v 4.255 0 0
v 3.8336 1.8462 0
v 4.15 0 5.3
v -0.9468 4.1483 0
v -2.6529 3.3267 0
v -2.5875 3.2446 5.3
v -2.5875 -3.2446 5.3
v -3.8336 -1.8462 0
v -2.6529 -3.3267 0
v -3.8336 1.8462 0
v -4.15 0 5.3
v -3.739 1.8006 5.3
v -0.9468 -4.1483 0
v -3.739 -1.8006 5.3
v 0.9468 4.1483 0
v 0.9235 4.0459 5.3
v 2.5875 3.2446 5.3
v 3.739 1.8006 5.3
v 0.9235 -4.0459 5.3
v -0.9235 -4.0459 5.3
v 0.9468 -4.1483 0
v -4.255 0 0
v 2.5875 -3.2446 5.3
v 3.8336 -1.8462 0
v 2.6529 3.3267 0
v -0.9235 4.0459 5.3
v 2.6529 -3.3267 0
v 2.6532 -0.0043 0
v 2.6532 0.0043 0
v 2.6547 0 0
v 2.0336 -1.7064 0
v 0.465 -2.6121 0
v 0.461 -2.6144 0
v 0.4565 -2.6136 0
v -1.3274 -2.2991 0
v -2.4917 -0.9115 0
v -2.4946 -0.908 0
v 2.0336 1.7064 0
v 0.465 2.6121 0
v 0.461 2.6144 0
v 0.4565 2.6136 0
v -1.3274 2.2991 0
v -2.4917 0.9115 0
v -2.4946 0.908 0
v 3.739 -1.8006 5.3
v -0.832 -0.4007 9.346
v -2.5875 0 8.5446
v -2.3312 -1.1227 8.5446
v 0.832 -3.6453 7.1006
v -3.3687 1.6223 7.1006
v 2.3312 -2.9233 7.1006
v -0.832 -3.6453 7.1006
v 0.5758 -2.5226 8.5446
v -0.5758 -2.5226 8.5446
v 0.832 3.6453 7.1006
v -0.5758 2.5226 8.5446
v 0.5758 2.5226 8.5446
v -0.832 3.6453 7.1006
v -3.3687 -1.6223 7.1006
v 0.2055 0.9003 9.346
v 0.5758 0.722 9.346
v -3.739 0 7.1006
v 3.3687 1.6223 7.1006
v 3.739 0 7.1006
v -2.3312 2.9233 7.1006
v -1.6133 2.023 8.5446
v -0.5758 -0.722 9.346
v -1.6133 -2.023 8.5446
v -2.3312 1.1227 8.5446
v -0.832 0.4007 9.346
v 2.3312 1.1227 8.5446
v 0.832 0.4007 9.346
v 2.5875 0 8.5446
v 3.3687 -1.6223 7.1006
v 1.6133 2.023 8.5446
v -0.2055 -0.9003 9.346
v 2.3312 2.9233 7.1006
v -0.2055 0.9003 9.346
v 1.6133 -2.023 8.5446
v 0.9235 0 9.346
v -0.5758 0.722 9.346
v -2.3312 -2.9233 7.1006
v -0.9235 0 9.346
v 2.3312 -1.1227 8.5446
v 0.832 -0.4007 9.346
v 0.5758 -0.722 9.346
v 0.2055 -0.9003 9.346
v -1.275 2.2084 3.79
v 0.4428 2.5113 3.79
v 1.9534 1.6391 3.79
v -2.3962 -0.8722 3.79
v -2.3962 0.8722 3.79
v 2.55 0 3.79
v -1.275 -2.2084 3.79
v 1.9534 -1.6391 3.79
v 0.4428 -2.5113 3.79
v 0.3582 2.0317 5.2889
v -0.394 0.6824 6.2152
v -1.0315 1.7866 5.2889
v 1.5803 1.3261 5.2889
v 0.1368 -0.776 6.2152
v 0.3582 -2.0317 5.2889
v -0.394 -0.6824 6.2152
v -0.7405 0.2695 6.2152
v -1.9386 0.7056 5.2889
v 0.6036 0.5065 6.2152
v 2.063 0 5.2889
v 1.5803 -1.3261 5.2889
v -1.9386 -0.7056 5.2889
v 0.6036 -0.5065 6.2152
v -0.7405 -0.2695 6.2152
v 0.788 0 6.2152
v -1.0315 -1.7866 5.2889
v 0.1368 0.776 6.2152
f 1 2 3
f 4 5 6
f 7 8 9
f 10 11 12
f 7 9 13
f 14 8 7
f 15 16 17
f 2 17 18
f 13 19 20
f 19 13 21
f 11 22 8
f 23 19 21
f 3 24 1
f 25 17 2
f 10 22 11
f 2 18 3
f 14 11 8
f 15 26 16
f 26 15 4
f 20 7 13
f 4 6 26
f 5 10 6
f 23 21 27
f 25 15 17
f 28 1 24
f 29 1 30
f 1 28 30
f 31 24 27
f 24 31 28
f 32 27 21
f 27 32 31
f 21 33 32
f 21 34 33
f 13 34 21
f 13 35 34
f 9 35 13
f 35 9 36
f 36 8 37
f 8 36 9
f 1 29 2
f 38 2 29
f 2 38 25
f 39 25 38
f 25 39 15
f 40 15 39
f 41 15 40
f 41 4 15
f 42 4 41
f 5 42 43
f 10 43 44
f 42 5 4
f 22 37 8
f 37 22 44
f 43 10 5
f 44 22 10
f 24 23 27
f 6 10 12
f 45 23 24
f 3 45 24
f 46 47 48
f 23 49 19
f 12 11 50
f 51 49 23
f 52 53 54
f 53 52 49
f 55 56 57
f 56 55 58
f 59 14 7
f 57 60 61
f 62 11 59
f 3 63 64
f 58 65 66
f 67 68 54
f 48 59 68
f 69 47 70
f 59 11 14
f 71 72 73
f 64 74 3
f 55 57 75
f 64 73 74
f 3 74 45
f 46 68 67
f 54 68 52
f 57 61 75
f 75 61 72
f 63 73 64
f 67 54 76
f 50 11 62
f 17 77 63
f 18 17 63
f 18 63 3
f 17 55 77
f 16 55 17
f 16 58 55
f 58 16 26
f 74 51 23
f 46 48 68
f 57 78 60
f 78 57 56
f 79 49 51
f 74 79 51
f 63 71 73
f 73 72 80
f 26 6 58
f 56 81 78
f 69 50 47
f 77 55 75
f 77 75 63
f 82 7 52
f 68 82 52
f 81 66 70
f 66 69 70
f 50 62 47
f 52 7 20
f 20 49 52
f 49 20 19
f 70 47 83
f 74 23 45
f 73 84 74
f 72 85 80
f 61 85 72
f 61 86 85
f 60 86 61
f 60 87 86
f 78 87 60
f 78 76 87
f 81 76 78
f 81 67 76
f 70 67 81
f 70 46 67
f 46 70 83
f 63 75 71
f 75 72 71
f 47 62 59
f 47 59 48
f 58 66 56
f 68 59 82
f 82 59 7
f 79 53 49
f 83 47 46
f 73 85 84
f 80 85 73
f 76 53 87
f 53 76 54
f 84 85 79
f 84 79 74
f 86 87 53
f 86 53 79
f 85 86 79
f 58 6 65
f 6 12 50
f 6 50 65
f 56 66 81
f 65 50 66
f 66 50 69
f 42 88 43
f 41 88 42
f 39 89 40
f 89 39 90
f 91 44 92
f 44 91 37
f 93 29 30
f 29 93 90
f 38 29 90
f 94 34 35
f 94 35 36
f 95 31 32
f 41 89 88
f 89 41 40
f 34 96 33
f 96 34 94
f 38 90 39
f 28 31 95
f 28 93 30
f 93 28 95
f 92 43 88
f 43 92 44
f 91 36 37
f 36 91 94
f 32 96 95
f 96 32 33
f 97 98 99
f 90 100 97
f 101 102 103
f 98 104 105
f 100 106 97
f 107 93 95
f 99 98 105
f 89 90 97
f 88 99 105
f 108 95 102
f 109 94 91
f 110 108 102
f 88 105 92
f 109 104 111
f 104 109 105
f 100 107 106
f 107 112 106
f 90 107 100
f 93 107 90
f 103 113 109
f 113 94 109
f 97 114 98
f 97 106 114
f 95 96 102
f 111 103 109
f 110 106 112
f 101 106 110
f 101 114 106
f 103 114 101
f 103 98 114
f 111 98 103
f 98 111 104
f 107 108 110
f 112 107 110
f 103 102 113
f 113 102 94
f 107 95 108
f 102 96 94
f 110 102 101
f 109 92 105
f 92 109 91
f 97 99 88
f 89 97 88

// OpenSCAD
 
    difference () {
 
          translate ([0, 0, 2.65]) {
            union () {
              color("springgreen", 0.5)
              cylinder (h=5.3, r1=4.255, r2=4.15, center=true);
              translate ([0, 0, 2.65]) {
                sphere (r=4.15);
              }
            }
          }

 
 
        translate ([0, 0, 1.89]) {
          union () {
            
            cylinder (h=3.8, r1=2.655, r2=2.55, center=true);
            translate ([0, 0, 1.9]) {
              sphere (r=2.55);
            }
          }
        }
 

    }
 
